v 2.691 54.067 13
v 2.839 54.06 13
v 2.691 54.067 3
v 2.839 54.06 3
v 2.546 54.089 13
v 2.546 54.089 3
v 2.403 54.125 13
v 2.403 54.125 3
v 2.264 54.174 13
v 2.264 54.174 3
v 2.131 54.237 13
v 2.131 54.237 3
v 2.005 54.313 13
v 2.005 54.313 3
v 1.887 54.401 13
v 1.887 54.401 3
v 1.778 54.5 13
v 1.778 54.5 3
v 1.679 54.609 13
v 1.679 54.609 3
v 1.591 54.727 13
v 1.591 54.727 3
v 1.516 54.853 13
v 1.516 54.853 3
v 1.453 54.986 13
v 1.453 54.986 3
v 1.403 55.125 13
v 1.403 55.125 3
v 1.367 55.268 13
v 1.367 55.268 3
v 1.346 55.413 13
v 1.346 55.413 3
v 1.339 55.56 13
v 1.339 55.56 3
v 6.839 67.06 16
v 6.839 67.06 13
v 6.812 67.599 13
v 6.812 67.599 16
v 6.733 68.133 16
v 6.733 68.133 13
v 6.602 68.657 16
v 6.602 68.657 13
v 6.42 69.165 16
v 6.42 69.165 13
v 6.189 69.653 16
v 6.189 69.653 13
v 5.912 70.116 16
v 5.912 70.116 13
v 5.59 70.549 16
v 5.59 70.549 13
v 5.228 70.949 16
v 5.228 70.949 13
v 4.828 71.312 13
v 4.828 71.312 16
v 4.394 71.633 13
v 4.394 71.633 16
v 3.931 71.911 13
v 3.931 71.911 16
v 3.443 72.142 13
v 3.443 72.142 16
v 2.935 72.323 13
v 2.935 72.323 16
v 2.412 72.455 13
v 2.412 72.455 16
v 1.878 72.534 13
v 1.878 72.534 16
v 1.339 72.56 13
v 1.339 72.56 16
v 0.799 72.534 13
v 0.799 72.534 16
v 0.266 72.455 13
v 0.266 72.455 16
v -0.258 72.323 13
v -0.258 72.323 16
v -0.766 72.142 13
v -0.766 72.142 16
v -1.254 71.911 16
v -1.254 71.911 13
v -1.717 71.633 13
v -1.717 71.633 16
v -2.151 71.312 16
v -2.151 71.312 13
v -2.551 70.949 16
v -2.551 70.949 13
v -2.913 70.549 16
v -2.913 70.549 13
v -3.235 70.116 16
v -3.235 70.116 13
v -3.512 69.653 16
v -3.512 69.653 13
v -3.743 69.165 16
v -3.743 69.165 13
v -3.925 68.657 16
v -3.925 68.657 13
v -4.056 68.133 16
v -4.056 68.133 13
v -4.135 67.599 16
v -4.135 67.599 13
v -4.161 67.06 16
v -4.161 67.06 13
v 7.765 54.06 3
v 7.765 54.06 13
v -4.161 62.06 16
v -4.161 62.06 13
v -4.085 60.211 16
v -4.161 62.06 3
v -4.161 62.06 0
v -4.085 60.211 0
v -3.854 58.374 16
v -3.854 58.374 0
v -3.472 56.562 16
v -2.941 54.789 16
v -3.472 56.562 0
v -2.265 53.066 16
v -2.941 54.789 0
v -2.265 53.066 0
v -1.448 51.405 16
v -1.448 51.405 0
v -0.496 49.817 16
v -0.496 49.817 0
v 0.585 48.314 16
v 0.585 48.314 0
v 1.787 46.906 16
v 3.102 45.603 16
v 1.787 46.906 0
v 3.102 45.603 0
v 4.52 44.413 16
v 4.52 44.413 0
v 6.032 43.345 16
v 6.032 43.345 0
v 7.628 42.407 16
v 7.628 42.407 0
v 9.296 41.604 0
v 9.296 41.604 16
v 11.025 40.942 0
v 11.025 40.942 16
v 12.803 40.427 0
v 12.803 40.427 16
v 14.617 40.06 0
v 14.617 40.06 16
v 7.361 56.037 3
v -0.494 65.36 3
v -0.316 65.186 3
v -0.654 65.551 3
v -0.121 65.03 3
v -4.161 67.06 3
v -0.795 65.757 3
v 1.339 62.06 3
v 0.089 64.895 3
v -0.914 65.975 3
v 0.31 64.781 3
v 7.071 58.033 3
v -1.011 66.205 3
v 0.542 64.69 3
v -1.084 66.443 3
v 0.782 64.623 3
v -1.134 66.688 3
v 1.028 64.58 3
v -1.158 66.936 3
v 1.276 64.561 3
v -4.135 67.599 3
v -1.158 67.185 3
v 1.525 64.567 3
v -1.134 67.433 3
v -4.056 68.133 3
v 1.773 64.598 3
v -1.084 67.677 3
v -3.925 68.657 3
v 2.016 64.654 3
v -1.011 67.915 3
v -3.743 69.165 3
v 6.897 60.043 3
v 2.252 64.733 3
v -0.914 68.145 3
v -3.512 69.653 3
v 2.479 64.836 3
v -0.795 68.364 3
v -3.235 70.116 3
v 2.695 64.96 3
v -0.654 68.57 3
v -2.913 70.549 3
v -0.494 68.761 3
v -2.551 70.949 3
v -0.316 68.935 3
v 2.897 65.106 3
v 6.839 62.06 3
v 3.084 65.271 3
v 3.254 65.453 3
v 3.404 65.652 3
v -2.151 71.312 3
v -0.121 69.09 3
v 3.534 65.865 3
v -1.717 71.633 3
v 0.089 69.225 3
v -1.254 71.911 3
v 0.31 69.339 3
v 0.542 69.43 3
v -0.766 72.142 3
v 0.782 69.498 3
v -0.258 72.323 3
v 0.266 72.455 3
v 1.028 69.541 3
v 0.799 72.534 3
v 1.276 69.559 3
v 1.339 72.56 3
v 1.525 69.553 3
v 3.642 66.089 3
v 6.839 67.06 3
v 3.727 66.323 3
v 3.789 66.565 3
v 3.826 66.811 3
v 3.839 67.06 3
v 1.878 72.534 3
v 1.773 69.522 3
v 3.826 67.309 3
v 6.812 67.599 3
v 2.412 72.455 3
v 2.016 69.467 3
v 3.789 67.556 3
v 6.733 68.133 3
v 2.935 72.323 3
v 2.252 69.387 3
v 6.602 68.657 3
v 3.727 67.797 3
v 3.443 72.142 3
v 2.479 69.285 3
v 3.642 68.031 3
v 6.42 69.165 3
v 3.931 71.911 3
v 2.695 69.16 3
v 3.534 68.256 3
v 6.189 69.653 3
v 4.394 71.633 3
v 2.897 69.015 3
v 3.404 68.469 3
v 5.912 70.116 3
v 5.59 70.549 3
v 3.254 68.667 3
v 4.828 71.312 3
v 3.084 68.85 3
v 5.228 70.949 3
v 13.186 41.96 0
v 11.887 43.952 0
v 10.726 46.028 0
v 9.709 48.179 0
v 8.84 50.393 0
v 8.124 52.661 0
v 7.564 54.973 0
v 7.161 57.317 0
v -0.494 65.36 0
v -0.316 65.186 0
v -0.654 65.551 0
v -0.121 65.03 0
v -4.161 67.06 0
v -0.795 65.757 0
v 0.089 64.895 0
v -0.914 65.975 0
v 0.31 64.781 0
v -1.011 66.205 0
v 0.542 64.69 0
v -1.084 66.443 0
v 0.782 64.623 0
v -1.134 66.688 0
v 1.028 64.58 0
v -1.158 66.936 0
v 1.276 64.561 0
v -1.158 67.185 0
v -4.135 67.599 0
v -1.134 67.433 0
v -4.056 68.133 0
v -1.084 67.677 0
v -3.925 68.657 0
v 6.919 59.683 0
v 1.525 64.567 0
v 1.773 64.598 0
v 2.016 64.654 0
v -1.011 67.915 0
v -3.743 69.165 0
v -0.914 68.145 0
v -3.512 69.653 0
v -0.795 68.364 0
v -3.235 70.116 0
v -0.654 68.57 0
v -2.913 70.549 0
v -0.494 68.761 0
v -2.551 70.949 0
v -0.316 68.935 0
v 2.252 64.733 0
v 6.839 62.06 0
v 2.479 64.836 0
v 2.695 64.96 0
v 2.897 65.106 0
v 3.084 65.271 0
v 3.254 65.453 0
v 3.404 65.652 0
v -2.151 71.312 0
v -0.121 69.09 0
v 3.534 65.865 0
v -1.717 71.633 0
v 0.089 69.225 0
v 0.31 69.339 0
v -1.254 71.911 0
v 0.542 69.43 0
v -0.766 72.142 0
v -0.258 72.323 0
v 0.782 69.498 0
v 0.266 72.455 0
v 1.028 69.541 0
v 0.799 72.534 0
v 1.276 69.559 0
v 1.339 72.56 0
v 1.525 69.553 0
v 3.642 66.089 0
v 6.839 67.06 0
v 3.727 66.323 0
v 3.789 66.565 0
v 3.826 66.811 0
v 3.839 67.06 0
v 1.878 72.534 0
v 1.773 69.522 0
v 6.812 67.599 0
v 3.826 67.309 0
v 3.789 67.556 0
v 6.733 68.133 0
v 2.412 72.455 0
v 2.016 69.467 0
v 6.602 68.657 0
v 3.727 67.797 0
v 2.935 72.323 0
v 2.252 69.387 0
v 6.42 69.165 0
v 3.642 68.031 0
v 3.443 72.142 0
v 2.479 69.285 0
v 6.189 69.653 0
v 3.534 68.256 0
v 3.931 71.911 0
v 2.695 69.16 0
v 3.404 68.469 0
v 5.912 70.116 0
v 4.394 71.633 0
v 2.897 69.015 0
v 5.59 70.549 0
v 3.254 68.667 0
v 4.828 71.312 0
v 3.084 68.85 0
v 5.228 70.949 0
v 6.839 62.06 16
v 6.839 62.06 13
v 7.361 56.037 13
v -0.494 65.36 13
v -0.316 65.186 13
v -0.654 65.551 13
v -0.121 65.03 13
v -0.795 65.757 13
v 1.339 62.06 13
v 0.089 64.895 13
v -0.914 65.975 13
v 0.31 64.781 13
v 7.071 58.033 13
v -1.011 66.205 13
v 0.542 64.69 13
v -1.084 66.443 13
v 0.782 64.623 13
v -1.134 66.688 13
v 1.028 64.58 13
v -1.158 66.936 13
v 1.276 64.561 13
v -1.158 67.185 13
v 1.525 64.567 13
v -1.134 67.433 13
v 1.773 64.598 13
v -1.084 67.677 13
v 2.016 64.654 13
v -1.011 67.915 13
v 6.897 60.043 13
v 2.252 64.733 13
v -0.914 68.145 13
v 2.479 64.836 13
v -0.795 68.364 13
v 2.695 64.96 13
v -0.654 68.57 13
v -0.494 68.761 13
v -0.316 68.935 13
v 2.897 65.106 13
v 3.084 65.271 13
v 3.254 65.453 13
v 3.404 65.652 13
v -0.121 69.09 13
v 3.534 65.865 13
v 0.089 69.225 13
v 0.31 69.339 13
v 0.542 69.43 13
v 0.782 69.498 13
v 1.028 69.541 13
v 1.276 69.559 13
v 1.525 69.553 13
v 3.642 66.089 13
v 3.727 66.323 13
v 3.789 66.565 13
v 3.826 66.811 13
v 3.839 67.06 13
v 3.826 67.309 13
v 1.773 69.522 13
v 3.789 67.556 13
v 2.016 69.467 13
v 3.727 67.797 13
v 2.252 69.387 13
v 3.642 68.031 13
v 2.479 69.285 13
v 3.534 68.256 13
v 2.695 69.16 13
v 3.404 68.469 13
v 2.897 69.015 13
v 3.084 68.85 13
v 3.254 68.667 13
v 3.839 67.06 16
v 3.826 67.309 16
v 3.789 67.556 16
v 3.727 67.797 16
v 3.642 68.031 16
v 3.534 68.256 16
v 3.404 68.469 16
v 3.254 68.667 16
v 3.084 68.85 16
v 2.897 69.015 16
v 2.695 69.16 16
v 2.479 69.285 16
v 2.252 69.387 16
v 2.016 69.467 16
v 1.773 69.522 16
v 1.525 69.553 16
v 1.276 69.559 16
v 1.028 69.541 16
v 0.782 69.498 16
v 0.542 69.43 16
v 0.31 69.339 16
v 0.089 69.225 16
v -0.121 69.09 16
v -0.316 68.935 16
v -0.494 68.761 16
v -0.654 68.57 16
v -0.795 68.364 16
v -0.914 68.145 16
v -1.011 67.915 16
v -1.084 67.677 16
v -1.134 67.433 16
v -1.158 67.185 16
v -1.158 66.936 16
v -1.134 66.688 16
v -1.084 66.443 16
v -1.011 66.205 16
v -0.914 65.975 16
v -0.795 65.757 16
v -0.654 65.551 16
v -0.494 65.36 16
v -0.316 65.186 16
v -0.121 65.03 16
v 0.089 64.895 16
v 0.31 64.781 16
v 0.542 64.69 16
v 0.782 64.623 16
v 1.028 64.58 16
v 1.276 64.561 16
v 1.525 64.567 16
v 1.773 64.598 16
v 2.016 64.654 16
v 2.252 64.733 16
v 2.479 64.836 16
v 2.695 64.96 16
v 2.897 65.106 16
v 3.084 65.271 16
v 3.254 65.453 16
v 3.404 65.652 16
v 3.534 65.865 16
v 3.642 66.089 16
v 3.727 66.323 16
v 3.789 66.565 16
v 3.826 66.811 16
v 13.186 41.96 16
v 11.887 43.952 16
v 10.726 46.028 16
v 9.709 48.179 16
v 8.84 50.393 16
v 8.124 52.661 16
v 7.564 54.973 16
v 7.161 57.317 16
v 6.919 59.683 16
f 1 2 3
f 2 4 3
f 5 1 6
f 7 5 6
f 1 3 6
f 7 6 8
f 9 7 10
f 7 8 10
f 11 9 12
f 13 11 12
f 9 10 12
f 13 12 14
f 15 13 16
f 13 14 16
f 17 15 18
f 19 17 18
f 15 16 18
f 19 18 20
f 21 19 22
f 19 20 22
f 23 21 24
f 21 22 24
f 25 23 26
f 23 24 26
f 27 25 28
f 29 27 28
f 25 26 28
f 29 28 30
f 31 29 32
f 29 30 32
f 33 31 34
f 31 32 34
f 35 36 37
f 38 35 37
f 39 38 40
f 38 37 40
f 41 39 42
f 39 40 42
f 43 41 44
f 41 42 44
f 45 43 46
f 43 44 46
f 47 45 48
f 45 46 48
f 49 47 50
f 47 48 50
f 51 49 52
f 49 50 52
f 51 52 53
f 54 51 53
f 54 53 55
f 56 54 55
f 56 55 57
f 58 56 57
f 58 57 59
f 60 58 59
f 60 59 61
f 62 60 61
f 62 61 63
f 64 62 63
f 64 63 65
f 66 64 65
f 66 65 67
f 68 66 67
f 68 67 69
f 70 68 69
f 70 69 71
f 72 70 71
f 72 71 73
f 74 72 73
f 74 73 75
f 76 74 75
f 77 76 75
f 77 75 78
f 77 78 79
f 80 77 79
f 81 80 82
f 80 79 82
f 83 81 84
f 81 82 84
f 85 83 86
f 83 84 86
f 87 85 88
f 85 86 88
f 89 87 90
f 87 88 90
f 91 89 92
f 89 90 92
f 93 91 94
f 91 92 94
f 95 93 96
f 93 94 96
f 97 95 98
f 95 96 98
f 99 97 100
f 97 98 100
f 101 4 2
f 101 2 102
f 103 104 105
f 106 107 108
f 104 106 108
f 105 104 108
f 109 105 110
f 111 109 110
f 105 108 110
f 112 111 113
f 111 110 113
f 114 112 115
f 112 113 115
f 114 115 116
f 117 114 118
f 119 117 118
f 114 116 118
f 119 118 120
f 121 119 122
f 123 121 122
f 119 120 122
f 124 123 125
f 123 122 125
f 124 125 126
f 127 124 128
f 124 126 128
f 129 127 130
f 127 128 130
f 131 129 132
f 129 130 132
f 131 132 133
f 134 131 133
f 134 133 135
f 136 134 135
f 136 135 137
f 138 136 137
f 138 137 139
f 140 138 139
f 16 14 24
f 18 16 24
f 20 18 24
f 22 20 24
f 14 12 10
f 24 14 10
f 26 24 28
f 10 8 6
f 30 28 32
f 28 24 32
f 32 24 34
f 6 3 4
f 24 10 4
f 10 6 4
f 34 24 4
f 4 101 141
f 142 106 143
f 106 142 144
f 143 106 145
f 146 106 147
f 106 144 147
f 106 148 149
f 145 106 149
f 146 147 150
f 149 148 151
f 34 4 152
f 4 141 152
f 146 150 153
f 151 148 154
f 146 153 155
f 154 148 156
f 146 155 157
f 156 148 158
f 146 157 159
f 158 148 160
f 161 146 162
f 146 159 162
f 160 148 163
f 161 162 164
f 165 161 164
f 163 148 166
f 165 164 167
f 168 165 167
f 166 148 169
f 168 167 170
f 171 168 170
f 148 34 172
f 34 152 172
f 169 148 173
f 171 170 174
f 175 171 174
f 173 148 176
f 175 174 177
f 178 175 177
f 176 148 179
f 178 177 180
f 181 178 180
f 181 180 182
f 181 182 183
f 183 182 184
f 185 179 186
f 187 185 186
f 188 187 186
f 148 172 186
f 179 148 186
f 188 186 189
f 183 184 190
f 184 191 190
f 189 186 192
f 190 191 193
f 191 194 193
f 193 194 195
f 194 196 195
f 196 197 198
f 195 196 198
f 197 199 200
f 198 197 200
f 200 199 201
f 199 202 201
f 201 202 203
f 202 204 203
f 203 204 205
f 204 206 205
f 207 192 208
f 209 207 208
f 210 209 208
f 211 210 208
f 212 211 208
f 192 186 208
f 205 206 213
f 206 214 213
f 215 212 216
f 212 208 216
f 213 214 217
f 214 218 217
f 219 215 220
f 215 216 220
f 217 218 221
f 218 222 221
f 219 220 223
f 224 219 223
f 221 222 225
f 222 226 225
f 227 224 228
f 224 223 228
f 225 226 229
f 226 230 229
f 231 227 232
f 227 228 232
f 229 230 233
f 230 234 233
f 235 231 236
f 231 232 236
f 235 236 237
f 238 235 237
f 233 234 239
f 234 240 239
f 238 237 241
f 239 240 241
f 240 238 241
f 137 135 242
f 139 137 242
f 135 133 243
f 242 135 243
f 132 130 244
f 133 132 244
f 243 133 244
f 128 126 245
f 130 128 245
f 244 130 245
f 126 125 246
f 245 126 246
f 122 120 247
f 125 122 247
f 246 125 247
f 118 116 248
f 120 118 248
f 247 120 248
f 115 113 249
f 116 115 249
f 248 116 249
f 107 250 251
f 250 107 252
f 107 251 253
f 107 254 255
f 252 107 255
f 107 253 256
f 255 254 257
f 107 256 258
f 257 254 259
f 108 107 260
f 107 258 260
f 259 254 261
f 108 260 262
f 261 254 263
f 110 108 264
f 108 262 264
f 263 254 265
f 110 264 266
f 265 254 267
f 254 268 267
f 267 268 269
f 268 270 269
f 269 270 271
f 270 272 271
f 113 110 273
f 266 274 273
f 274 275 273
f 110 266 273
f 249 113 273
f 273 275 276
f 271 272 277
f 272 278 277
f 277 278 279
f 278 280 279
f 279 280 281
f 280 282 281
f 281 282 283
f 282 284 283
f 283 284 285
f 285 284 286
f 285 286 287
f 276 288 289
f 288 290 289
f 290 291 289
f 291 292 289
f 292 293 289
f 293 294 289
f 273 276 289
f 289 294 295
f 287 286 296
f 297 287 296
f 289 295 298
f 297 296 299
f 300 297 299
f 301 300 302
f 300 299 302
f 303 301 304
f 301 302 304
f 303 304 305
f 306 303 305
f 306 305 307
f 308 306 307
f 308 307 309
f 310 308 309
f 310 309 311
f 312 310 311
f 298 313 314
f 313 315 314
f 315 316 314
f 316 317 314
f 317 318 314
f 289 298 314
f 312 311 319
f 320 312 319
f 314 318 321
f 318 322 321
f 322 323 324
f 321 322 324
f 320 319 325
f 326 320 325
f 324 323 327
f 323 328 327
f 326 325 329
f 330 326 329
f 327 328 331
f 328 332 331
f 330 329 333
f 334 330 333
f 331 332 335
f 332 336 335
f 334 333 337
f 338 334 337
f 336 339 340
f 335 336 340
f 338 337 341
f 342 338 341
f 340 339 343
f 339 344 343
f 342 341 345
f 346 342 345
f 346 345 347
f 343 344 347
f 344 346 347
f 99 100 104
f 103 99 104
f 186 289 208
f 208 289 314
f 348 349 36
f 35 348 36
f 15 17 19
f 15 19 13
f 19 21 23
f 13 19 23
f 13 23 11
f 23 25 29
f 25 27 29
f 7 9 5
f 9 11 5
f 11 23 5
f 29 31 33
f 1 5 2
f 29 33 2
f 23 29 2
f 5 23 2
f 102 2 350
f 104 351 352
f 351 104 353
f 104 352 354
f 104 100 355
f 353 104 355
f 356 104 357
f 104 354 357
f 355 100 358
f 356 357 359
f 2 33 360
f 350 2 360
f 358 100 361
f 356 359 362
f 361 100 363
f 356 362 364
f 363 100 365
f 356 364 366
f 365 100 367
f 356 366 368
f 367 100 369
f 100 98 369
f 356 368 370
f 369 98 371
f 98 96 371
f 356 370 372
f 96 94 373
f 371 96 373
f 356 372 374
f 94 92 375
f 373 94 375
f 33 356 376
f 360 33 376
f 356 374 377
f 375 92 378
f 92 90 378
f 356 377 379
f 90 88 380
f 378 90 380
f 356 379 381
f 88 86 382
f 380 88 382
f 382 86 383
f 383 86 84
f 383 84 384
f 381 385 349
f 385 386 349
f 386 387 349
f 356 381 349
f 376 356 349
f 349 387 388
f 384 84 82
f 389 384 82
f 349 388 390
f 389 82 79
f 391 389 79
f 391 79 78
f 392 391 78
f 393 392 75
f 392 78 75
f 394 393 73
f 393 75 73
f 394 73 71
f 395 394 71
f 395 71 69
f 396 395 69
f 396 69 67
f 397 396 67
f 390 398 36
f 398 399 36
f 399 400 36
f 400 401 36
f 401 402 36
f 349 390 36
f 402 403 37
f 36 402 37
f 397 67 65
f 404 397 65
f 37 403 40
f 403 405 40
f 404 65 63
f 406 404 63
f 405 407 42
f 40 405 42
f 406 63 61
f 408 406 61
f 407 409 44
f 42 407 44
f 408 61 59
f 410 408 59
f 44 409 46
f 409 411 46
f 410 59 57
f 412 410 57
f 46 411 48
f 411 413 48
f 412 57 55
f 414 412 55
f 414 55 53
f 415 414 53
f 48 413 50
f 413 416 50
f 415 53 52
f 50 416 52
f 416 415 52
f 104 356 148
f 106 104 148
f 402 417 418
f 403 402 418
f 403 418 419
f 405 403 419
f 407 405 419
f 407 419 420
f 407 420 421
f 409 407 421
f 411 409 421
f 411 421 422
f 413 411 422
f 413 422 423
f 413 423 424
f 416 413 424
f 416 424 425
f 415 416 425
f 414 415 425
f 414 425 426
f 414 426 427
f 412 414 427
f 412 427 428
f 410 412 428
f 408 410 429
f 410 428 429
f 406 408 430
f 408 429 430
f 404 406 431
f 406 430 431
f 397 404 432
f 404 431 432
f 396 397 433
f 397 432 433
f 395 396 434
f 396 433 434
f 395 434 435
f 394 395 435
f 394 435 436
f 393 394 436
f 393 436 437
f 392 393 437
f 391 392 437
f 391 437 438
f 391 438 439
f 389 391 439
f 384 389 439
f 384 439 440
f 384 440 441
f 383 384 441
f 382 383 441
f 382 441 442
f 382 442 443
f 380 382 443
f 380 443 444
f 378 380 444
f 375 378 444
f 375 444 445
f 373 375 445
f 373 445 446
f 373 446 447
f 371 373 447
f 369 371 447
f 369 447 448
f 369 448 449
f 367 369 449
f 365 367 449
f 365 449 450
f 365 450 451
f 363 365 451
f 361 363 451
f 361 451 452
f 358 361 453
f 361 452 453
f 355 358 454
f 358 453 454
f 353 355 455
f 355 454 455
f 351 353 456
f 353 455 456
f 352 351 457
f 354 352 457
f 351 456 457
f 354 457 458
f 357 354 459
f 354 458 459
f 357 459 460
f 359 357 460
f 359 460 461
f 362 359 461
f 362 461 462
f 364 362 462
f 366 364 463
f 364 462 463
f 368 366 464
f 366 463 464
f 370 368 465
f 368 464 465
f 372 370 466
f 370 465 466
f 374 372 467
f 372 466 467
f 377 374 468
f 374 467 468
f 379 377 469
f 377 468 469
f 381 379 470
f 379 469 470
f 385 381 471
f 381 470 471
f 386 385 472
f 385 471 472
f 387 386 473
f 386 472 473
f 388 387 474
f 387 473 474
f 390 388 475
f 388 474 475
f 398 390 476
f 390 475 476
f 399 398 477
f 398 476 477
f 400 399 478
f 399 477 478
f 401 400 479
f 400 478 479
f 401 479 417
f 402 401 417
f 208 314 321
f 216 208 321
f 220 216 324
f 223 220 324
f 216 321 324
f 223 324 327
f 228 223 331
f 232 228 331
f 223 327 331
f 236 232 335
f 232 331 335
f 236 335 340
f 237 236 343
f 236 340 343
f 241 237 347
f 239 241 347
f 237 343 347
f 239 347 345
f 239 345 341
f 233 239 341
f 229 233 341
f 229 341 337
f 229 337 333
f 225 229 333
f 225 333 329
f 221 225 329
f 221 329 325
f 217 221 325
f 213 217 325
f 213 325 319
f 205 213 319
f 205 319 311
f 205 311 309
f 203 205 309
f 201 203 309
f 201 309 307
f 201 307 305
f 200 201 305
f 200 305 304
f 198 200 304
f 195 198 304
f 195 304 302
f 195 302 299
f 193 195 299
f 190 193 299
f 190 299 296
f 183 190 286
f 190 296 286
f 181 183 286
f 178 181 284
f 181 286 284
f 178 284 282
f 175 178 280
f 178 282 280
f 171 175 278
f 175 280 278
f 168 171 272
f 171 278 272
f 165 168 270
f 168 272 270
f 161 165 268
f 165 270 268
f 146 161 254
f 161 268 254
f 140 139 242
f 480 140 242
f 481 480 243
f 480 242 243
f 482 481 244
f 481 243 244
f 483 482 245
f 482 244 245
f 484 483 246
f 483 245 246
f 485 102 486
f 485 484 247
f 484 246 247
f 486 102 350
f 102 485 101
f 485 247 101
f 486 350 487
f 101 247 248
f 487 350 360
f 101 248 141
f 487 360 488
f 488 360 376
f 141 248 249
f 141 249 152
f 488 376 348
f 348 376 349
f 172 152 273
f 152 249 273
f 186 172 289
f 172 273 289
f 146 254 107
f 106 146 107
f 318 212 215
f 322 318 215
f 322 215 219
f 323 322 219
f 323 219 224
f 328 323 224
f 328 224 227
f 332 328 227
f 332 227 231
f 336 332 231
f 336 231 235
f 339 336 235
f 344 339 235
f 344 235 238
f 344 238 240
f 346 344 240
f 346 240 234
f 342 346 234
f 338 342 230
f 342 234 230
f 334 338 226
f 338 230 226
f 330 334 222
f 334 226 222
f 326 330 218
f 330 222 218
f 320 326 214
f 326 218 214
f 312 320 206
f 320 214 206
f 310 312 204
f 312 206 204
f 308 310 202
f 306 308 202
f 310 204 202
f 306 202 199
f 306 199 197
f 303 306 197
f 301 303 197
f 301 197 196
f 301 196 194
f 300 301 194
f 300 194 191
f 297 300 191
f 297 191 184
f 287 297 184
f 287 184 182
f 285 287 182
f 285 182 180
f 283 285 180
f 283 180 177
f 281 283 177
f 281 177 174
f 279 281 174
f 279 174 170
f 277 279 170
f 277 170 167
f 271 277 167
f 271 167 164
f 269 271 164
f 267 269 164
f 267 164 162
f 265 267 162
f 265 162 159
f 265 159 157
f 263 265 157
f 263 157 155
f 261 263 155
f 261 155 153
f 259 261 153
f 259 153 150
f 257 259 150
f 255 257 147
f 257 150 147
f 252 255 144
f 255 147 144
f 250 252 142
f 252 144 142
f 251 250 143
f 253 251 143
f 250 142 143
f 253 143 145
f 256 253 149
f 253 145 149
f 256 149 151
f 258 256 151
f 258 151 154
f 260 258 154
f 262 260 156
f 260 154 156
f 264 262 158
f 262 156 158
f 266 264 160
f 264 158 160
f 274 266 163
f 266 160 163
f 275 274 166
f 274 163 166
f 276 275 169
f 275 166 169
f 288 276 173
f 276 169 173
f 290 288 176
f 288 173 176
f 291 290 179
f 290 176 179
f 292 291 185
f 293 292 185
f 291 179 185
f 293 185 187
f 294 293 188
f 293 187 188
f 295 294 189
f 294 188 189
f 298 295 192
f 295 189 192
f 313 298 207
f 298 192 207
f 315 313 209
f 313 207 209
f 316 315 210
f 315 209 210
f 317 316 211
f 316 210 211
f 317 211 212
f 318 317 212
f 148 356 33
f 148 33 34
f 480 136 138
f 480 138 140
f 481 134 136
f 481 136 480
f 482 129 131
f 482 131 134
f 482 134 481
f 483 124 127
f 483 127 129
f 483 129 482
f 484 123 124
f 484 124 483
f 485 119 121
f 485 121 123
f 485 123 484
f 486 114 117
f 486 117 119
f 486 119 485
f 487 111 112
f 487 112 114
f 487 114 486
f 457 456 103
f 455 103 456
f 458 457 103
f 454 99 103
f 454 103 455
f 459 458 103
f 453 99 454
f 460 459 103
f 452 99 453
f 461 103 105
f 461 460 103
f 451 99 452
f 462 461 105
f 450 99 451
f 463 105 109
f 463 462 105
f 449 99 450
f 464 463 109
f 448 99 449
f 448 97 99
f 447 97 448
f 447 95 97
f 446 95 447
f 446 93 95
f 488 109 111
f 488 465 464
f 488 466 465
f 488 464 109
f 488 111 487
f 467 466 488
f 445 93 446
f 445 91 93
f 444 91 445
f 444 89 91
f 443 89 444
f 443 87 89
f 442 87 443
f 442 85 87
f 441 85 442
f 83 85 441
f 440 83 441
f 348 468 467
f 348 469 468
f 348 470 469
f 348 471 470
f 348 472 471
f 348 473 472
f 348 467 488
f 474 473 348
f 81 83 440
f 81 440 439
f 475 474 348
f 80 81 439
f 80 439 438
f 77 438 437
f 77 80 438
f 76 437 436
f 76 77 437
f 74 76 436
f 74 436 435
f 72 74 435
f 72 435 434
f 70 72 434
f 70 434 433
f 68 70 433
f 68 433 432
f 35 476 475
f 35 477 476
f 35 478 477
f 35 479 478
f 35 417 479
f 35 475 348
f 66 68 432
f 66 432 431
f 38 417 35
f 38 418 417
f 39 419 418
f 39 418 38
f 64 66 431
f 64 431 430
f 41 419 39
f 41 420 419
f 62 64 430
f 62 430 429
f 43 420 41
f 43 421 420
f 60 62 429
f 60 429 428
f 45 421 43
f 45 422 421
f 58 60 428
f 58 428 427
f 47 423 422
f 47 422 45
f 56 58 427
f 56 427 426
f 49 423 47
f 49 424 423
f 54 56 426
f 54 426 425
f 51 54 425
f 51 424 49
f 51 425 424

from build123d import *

# Parameters (mm, degrees)
EXTRUDE_1_DEPTH     = 16
SKETCH_2_R          = 2.5
CUT_EXTRUDE_1_DEPTH = 76.727440999
SKETCH_3_W          = 10
SKETCH_3_H          = 10.5
CUT_EXTRUDE_2_DEPTH = 16
SKETCH_4_W          = 7
SKETCH_4_H          = 10
CUT_EXTRUDE_3_DEPTH = 8
FILLET_1_R          = 1.5


with BuildPart() as part:
    # 草图1 → 凸台-拉伸1 (new body)
    with BuildSketch(Plane.XY):
        with BuildLine():
            Line((-4.161479336, 67.0602), (-4.161479336, 62.0602))
            ThreePointArc((-4.161479336, 62.0602), (1.171570518, 47.59784366), (14.617205486, 40.0602))
            ThreePointArc((14.617205486, 40.0602), (8.840444726, 50.39285307), (6.838520664, 62.0602))
            Line((6.838520664, 62.0602), (6.838520664, 67.0602))
            ThreePointArc((6.838520664, 67.0602), (1.338520664, 72.5602), (-4.161479336, 67.0602))
        make_face()
    extrude(amount=EXTRUDE_1_DEPTH)

    # 草图2 → 切除-拉伸1 (cut, through all)
    with BuildSketch(Plane.XY.offset(16)):
        with Locations((1.338520664, 67.0602)):
            Circle(SKETCH_2_R)
    extrude(amount=-CUT_EXTRUDE_1_DEPTH, mode=Mode.SUBTRACT)

    # 草图3 → 切除-拉伸2 (cut)
    with BuildSketch(Plane(origin=(6.838520664, 0, 0), x_dir=(0, 0, -1), z_dir=(1, 0, 0))):
        with Locations((-8, 67.3102)):
            Rectangle(SKETCH_3_W, SKETCH_3_H)
    extrude(amount=-CUT_EXTRUDE_2_DEPTH, mode=Mode.SUBTRACT)

    # 草图4 → 切除-拉伸3 (cut)
    with BuildSketch(Plane(origin=(0, 62.0602, 0), x_dir=(1, 0, 0), z_dir=(0, 1, 0))):
        with Locations((4.838520664, -8)):
            Rectangle(SKETCH_4_W, SKETCH_4_H)
    extrude(amount=-CUT_EXTRUDE_3_DEPTH, mode=Mode.SUBTRACT)

    # 圆角1
    fillet_1_edges = [part.edges().sort_by_distance(p)[0] for p in [
        (1.338520664, 54.0602, 8),
    ]]
    fillet(fillet_1_edges, radius=FILLET_1_R)


solid = part.part
